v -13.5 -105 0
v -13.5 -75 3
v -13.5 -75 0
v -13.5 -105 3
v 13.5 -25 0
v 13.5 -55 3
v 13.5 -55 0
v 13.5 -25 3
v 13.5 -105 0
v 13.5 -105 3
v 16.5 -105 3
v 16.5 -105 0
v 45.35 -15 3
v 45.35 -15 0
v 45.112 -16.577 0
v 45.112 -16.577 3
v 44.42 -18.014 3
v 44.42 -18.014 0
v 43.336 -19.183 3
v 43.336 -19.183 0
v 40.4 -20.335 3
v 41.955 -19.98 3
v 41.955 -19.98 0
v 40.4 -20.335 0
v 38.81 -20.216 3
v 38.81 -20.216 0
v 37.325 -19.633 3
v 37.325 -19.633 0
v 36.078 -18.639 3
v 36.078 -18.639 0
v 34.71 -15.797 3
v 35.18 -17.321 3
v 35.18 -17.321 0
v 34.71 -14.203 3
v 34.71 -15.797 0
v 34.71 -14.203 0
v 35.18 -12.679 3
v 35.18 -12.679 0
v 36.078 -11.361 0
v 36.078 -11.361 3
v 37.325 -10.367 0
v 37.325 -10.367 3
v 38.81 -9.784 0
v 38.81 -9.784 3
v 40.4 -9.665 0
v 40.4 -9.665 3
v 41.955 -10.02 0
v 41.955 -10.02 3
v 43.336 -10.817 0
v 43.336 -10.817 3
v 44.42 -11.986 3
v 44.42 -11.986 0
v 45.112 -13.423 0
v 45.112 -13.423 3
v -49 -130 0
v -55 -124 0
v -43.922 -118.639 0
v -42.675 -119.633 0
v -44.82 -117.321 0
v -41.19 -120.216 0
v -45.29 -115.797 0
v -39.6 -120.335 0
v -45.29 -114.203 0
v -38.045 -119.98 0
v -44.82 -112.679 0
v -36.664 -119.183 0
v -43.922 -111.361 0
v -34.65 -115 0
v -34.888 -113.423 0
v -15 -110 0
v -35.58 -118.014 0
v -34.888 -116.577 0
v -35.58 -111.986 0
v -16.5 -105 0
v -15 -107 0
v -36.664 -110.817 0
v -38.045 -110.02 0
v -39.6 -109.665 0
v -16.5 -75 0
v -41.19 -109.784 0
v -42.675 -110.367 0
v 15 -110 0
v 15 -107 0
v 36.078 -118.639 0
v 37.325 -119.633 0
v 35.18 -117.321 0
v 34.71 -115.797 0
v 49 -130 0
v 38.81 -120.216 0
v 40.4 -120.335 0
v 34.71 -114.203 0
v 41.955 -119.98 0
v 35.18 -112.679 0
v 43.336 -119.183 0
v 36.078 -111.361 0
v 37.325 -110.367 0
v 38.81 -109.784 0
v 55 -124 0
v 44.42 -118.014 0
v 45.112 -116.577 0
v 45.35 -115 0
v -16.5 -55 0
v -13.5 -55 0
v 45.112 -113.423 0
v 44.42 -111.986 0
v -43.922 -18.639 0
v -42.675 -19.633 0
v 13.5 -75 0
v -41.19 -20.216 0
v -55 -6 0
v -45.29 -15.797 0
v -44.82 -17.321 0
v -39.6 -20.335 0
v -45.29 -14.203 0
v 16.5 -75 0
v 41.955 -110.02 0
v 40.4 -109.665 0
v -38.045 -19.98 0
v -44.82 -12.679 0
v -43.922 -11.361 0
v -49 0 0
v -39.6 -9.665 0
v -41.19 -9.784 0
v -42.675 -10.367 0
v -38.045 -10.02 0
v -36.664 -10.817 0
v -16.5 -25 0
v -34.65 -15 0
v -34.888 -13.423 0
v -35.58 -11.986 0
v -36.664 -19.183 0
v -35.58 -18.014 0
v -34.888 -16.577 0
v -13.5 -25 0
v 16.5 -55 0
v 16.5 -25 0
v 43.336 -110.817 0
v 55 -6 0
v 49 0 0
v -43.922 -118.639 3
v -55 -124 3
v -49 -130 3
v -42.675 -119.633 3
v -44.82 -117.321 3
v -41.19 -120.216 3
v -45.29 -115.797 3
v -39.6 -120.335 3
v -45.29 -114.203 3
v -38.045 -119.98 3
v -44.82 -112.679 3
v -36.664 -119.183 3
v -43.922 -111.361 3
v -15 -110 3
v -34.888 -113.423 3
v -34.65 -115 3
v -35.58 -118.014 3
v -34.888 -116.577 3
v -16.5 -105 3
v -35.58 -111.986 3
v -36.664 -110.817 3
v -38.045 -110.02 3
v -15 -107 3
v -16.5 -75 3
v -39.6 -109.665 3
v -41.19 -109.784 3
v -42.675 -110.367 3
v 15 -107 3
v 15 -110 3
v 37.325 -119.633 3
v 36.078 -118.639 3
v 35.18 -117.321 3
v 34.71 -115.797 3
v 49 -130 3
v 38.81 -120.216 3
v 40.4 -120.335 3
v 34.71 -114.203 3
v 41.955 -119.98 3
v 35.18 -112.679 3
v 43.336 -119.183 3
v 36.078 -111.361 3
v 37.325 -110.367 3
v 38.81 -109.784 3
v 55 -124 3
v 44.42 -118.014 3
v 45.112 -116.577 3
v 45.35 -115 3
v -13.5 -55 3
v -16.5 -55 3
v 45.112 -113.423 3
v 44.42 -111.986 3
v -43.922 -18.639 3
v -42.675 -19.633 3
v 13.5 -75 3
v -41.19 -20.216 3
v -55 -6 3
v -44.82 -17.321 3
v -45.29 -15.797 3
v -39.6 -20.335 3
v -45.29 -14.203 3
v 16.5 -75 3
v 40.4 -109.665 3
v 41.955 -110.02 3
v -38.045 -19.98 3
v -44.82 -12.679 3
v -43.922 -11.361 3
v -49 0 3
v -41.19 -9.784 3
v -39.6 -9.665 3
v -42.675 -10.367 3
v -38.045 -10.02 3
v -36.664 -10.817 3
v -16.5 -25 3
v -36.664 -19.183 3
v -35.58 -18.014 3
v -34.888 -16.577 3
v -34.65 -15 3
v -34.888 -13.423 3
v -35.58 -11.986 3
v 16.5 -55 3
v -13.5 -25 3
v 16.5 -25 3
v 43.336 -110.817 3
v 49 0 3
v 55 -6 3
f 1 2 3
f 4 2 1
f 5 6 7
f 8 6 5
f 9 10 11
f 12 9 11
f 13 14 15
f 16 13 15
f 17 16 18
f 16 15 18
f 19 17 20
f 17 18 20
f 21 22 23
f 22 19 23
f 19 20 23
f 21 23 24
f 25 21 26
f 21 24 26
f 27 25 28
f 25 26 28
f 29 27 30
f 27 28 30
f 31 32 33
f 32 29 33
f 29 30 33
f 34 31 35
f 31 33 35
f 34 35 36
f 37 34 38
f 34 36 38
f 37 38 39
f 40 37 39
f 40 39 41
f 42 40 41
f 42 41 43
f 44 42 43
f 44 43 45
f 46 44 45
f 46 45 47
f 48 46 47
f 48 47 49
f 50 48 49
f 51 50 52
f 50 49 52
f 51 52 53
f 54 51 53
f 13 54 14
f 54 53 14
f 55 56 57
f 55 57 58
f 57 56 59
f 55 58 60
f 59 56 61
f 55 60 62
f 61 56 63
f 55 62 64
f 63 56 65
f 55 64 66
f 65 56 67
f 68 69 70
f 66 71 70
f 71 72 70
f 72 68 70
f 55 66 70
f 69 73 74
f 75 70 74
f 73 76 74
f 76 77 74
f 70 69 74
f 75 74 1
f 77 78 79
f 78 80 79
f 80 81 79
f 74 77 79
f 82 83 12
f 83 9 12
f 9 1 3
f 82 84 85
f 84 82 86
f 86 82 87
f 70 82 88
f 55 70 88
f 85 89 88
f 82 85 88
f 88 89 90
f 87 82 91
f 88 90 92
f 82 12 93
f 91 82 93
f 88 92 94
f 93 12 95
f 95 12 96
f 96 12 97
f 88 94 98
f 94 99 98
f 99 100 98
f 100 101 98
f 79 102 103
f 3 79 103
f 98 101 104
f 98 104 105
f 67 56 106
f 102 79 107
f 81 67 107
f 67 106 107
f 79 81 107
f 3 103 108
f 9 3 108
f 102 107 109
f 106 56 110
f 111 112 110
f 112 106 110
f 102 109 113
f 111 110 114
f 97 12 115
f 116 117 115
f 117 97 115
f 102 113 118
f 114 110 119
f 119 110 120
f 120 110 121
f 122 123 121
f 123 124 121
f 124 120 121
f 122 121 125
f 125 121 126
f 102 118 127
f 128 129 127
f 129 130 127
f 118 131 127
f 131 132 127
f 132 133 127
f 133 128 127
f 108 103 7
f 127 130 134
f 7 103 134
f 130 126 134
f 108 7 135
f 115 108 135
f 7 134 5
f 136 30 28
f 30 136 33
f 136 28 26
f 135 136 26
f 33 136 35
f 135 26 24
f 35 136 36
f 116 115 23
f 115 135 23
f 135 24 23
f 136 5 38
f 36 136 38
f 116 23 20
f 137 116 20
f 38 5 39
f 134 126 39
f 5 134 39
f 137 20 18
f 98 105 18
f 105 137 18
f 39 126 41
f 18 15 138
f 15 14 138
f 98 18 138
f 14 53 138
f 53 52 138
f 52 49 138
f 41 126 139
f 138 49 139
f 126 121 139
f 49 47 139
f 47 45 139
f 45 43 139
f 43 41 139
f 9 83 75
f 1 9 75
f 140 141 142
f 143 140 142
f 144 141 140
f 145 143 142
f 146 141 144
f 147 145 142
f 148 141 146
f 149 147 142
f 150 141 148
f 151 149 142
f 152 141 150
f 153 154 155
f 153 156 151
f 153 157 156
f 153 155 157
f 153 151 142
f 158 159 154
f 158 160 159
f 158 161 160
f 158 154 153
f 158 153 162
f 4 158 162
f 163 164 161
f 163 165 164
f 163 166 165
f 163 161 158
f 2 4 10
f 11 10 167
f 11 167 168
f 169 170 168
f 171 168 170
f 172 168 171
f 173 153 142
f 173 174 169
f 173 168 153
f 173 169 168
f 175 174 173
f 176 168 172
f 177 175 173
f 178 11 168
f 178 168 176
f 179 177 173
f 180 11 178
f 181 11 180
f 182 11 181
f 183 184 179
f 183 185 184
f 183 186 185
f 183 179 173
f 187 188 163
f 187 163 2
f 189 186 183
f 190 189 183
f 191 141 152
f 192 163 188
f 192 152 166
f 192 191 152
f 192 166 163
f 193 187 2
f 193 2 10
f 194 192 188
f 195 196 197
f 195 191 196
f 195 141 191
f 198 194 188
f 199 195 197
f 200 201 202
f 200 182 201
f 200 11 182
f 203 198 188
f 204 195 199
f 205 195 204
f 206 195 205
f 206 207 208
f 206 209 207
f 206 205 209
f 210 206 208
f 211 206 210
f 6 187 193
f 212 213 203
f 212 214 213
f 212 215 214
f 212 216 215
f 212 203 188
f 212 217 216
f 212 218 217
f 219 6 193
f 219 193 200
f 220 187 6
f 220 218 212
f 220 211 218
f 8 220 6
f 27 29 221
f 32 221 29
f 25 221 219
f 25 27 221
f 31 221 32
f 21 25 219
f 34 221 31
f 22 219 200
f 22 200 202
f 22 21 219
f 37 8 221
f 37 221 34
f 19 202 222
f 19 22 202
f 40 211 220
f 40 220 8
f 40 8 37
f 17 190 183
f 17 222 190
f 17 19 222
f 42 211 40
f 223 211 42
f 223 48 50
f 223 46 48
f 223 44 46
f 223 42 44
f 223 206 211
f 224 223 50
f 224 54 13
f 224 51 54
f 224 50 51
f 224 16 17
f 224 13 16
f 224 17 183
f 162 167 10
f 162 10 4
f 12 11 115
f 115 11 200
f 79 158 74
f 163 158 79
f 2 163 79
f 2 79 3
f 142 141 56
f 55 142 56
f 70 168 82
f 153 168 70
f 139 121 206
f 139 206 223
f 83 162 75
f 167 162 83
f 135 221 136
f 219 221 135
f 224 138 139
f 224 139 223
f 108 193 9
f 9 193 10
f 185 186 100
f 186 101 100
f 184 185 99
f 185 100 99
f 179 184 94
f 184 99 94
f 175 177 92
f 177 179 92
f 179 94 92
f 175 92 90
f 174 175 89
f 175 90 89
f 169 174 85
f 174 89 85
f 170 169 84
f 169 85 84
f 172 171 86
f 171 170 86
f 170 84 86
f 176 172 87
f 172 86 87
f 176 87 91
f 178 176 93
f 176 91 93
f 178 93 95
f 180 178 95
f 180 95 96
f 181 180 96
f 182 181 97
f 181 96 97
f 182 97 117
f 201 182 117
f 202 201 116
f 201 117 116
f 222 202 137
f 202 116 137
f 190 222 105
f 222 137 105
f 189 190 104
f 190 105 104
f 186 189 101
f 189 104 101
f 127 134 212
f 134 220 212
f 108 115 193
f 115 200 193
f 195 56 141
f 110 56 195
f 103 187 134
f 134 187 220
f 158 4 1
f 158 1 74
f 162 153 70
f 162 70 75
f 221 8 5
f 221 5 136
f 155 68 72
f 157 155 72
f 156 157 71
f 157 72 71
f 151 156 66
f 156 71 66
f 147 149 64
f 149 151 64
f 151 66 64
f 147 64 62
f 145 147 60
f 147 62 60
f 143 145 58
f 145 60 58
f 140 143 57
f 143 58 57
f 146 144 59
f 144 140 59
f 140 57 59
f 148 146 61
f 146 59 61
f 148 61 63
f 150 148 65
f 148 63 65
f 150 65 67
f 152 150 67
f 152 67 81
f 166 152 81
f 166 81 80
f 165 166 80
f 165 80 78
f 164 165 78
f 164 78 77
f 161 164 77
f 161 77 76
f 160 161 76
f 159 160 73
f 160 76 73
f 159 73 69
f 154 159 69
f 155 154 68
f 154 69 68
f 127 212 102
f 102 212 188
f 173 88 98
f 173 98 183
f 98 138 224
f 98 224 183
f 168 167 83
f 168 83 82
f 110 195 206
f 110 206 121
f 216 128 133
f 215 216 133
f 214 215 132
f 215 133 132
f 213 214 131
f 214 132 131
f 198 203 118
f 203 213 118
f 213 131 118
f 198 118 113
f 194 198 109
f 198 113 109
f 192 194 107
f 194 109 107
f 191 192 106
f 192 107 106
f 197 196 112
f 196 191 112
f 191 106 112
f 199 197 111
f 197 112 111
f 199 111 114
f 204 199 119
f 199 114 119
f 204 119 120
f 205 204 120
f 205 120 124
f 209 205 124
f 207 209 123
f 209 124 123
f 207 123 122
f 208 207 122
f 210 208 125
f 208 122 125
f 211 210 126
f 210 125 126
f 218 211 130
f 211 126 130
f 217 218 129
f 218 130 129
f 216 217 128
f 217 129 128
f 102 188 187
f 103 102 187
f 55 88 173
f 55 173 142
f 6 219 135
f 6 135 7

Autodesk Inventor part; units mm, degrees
ref_plane "YZ Plane" through (0, 0, 0) normal (1, 0, 0) x (0, 1, 0)
ref_plane "XZ Plane" through (0, 0, 0) normal (0, 1, 0) x (-1, 0, 0)
ref_plane "XY Plane" through (0, 0, 0) normal (0, 0, 1) x (1, 0, 0)
sketch "Sketch1" plane through (0, 0, 0) normal (0, 0, 1) x (1, 0, 0)
  line L0 (-55, 0) -> (55, 0)
  line L1 (55, 0) -> (55, -130)
  line L2 (55, -130) -> (-55, -130)
  line L3 (-55, -130) -> (-55, 0)
  line L4 (0, 0) -> (0, -130)
  line L5 (-55, -65) -> (55, -65)
  circle A0 centre (40, -15) radius 5.35
  line L6 (55, -65) -> (-55, -65)
  circle A1 centre (-40, -15) radius 5.35
  circle A2 centre (40, -115) radius 5.35
  circle A3 centre (-40, -115) radius 5.35
  dimension "d0" = 110
  dimension "d1" = 130
  dimension "d2" = 10.7
  dimension "d3" = 40
  dimension "d4" = 50
extrude "Plate1" add sketch "Sketch1" along normal blind 3
sketch "Sketch2" plane through (0, 0, 3) normal (0, 0, 1) x (1, 0, 0)
  line L0 (13.5, -25) -> (16.5, -25)
  line L1 (16.5, -25) -> (16.5, -55)
  line L2 (16.5, -55) -> (13.5, -55)
  line L3 (13.5, -55) -> (13.5, -25)
  line L4 (0, 0) -> (0, -130)
  line L5 (-55, -130) -> (55, -130) projected
  line L6 (-55, 0) -> (55, 0) projected
  line L7 (-55, 0) -> (-55, -130) projected
  line L8 (-55, -65) -> (55, -65)
  line L9 (55, -130) -> (55, 0) projected
  line L10 (13.5, -105) -> (16.5, -105)
  line L11 (16.5, -105) -> (16.5, -75)
  line L12 (16.5, -75) -> (13.5, -75)
  line L13 (13.5, -75) -> (13.5, -105)
  line L14 (-13.5, -25) -> (-16.5, -25)
  line L15 (-16.5, -25) -> (-16.5, -55)
  line L16 (-16.5, -55) -> (-13.5, -55)
  line L17 (-13.5, -55) -> (-13.5, -25)
  line L18 (-13.5, -75) -> (-13.5, -105)
  line L19 (-16.5, -105) -> (-16.5, -75)
  line L20 (-13.5, -105) -> (-16.5, -105)
  line L21 (-16.5, -75) -> (-13.5, -75)
  line L22 (-15, -107) -> (15, -107)
  line L23 (15, -107) -> (15, -110)
  line L24 (15, -110) -> (-15, -110)
  line L25 (-15, -110) -> (-15, -107)
  point P0 (13.5, -40)
  point P1 (15, -25)
  point P2 (-15, -108.5)
  dimension "d6" = 3
  dimension "d7" = 30
  dimension "d8" = 13.5
  dimension "d9" = 25
  dimension "d10" = 30
  dimension "d11" = 3
  dimension "d12" = 15
  dimension "d13" = 20
extrude "Cut1" cut sketch "Sketch2" against normal blind 3 contours L0 L1 L2 L3 | L22 L23 L24 L4 | L4 L24 L25 L22 | L13 L12 L11 L10 | L17 L16 L15 L14 | L18 L20 L19 L21
chamfer "Corner Chamfer1" distance 6 angle 45 4 edges at (55, 0, 1.5) (-55, 0, 1.5) (-55, -130, 1.5) (55, -130, 1.5)
equation "\"d6\" = plate_thickness"
equation "\"d8\" = 0.5 * L_Piston_Bottom + A_joint_tolerance"
equation "\"d11\" = plate_thickness"
equation "\"d14\" = Thickness"
equation "\"d5\" = Thickness"
equation "\"Thickness\" = plate_thickness"
equation "\"BendRadius\" = Thickness"
equation "\"BendReliefWidth\" = Thickness"
equation "\"BendReliefDepth\" = 0.5 * Thickness"
equation "\"CornerReliefSize\" = 4 * Thickness"
equation "\"MinimumRemnant\" = 2 * Thickness"
equation "\"TransitionRadius\" = BendRadius"
equation "\"JacobiRadiusSize\" = BendRadius"
equation "\"GapSize\" = Thickness"
equation "\"A_width\" = 46"
equation "\"A_joint_diameter\" = 16"
equation "\"A_joint_tolerance\" = 3"
equation "\"l___________\" = 0"
equation "\"l__________\" = 0"
equation "\"l_________\" = 0"
equation "\"rivet_diameter\" = 3.35"
equation "\"plate_thickness\" = 3"
equation "\"l________\" = 0"
equation "\"L_Piston_Bottom\" = 21"
equation "\"L_Piston_Top\" = 25"
equation "\"A_B_spacing\" = 2"
equation "\"thin_plate\" = 1.5"
properties part number "Piston_FloorHinge_BasePlate" material "Stainless Steel"
